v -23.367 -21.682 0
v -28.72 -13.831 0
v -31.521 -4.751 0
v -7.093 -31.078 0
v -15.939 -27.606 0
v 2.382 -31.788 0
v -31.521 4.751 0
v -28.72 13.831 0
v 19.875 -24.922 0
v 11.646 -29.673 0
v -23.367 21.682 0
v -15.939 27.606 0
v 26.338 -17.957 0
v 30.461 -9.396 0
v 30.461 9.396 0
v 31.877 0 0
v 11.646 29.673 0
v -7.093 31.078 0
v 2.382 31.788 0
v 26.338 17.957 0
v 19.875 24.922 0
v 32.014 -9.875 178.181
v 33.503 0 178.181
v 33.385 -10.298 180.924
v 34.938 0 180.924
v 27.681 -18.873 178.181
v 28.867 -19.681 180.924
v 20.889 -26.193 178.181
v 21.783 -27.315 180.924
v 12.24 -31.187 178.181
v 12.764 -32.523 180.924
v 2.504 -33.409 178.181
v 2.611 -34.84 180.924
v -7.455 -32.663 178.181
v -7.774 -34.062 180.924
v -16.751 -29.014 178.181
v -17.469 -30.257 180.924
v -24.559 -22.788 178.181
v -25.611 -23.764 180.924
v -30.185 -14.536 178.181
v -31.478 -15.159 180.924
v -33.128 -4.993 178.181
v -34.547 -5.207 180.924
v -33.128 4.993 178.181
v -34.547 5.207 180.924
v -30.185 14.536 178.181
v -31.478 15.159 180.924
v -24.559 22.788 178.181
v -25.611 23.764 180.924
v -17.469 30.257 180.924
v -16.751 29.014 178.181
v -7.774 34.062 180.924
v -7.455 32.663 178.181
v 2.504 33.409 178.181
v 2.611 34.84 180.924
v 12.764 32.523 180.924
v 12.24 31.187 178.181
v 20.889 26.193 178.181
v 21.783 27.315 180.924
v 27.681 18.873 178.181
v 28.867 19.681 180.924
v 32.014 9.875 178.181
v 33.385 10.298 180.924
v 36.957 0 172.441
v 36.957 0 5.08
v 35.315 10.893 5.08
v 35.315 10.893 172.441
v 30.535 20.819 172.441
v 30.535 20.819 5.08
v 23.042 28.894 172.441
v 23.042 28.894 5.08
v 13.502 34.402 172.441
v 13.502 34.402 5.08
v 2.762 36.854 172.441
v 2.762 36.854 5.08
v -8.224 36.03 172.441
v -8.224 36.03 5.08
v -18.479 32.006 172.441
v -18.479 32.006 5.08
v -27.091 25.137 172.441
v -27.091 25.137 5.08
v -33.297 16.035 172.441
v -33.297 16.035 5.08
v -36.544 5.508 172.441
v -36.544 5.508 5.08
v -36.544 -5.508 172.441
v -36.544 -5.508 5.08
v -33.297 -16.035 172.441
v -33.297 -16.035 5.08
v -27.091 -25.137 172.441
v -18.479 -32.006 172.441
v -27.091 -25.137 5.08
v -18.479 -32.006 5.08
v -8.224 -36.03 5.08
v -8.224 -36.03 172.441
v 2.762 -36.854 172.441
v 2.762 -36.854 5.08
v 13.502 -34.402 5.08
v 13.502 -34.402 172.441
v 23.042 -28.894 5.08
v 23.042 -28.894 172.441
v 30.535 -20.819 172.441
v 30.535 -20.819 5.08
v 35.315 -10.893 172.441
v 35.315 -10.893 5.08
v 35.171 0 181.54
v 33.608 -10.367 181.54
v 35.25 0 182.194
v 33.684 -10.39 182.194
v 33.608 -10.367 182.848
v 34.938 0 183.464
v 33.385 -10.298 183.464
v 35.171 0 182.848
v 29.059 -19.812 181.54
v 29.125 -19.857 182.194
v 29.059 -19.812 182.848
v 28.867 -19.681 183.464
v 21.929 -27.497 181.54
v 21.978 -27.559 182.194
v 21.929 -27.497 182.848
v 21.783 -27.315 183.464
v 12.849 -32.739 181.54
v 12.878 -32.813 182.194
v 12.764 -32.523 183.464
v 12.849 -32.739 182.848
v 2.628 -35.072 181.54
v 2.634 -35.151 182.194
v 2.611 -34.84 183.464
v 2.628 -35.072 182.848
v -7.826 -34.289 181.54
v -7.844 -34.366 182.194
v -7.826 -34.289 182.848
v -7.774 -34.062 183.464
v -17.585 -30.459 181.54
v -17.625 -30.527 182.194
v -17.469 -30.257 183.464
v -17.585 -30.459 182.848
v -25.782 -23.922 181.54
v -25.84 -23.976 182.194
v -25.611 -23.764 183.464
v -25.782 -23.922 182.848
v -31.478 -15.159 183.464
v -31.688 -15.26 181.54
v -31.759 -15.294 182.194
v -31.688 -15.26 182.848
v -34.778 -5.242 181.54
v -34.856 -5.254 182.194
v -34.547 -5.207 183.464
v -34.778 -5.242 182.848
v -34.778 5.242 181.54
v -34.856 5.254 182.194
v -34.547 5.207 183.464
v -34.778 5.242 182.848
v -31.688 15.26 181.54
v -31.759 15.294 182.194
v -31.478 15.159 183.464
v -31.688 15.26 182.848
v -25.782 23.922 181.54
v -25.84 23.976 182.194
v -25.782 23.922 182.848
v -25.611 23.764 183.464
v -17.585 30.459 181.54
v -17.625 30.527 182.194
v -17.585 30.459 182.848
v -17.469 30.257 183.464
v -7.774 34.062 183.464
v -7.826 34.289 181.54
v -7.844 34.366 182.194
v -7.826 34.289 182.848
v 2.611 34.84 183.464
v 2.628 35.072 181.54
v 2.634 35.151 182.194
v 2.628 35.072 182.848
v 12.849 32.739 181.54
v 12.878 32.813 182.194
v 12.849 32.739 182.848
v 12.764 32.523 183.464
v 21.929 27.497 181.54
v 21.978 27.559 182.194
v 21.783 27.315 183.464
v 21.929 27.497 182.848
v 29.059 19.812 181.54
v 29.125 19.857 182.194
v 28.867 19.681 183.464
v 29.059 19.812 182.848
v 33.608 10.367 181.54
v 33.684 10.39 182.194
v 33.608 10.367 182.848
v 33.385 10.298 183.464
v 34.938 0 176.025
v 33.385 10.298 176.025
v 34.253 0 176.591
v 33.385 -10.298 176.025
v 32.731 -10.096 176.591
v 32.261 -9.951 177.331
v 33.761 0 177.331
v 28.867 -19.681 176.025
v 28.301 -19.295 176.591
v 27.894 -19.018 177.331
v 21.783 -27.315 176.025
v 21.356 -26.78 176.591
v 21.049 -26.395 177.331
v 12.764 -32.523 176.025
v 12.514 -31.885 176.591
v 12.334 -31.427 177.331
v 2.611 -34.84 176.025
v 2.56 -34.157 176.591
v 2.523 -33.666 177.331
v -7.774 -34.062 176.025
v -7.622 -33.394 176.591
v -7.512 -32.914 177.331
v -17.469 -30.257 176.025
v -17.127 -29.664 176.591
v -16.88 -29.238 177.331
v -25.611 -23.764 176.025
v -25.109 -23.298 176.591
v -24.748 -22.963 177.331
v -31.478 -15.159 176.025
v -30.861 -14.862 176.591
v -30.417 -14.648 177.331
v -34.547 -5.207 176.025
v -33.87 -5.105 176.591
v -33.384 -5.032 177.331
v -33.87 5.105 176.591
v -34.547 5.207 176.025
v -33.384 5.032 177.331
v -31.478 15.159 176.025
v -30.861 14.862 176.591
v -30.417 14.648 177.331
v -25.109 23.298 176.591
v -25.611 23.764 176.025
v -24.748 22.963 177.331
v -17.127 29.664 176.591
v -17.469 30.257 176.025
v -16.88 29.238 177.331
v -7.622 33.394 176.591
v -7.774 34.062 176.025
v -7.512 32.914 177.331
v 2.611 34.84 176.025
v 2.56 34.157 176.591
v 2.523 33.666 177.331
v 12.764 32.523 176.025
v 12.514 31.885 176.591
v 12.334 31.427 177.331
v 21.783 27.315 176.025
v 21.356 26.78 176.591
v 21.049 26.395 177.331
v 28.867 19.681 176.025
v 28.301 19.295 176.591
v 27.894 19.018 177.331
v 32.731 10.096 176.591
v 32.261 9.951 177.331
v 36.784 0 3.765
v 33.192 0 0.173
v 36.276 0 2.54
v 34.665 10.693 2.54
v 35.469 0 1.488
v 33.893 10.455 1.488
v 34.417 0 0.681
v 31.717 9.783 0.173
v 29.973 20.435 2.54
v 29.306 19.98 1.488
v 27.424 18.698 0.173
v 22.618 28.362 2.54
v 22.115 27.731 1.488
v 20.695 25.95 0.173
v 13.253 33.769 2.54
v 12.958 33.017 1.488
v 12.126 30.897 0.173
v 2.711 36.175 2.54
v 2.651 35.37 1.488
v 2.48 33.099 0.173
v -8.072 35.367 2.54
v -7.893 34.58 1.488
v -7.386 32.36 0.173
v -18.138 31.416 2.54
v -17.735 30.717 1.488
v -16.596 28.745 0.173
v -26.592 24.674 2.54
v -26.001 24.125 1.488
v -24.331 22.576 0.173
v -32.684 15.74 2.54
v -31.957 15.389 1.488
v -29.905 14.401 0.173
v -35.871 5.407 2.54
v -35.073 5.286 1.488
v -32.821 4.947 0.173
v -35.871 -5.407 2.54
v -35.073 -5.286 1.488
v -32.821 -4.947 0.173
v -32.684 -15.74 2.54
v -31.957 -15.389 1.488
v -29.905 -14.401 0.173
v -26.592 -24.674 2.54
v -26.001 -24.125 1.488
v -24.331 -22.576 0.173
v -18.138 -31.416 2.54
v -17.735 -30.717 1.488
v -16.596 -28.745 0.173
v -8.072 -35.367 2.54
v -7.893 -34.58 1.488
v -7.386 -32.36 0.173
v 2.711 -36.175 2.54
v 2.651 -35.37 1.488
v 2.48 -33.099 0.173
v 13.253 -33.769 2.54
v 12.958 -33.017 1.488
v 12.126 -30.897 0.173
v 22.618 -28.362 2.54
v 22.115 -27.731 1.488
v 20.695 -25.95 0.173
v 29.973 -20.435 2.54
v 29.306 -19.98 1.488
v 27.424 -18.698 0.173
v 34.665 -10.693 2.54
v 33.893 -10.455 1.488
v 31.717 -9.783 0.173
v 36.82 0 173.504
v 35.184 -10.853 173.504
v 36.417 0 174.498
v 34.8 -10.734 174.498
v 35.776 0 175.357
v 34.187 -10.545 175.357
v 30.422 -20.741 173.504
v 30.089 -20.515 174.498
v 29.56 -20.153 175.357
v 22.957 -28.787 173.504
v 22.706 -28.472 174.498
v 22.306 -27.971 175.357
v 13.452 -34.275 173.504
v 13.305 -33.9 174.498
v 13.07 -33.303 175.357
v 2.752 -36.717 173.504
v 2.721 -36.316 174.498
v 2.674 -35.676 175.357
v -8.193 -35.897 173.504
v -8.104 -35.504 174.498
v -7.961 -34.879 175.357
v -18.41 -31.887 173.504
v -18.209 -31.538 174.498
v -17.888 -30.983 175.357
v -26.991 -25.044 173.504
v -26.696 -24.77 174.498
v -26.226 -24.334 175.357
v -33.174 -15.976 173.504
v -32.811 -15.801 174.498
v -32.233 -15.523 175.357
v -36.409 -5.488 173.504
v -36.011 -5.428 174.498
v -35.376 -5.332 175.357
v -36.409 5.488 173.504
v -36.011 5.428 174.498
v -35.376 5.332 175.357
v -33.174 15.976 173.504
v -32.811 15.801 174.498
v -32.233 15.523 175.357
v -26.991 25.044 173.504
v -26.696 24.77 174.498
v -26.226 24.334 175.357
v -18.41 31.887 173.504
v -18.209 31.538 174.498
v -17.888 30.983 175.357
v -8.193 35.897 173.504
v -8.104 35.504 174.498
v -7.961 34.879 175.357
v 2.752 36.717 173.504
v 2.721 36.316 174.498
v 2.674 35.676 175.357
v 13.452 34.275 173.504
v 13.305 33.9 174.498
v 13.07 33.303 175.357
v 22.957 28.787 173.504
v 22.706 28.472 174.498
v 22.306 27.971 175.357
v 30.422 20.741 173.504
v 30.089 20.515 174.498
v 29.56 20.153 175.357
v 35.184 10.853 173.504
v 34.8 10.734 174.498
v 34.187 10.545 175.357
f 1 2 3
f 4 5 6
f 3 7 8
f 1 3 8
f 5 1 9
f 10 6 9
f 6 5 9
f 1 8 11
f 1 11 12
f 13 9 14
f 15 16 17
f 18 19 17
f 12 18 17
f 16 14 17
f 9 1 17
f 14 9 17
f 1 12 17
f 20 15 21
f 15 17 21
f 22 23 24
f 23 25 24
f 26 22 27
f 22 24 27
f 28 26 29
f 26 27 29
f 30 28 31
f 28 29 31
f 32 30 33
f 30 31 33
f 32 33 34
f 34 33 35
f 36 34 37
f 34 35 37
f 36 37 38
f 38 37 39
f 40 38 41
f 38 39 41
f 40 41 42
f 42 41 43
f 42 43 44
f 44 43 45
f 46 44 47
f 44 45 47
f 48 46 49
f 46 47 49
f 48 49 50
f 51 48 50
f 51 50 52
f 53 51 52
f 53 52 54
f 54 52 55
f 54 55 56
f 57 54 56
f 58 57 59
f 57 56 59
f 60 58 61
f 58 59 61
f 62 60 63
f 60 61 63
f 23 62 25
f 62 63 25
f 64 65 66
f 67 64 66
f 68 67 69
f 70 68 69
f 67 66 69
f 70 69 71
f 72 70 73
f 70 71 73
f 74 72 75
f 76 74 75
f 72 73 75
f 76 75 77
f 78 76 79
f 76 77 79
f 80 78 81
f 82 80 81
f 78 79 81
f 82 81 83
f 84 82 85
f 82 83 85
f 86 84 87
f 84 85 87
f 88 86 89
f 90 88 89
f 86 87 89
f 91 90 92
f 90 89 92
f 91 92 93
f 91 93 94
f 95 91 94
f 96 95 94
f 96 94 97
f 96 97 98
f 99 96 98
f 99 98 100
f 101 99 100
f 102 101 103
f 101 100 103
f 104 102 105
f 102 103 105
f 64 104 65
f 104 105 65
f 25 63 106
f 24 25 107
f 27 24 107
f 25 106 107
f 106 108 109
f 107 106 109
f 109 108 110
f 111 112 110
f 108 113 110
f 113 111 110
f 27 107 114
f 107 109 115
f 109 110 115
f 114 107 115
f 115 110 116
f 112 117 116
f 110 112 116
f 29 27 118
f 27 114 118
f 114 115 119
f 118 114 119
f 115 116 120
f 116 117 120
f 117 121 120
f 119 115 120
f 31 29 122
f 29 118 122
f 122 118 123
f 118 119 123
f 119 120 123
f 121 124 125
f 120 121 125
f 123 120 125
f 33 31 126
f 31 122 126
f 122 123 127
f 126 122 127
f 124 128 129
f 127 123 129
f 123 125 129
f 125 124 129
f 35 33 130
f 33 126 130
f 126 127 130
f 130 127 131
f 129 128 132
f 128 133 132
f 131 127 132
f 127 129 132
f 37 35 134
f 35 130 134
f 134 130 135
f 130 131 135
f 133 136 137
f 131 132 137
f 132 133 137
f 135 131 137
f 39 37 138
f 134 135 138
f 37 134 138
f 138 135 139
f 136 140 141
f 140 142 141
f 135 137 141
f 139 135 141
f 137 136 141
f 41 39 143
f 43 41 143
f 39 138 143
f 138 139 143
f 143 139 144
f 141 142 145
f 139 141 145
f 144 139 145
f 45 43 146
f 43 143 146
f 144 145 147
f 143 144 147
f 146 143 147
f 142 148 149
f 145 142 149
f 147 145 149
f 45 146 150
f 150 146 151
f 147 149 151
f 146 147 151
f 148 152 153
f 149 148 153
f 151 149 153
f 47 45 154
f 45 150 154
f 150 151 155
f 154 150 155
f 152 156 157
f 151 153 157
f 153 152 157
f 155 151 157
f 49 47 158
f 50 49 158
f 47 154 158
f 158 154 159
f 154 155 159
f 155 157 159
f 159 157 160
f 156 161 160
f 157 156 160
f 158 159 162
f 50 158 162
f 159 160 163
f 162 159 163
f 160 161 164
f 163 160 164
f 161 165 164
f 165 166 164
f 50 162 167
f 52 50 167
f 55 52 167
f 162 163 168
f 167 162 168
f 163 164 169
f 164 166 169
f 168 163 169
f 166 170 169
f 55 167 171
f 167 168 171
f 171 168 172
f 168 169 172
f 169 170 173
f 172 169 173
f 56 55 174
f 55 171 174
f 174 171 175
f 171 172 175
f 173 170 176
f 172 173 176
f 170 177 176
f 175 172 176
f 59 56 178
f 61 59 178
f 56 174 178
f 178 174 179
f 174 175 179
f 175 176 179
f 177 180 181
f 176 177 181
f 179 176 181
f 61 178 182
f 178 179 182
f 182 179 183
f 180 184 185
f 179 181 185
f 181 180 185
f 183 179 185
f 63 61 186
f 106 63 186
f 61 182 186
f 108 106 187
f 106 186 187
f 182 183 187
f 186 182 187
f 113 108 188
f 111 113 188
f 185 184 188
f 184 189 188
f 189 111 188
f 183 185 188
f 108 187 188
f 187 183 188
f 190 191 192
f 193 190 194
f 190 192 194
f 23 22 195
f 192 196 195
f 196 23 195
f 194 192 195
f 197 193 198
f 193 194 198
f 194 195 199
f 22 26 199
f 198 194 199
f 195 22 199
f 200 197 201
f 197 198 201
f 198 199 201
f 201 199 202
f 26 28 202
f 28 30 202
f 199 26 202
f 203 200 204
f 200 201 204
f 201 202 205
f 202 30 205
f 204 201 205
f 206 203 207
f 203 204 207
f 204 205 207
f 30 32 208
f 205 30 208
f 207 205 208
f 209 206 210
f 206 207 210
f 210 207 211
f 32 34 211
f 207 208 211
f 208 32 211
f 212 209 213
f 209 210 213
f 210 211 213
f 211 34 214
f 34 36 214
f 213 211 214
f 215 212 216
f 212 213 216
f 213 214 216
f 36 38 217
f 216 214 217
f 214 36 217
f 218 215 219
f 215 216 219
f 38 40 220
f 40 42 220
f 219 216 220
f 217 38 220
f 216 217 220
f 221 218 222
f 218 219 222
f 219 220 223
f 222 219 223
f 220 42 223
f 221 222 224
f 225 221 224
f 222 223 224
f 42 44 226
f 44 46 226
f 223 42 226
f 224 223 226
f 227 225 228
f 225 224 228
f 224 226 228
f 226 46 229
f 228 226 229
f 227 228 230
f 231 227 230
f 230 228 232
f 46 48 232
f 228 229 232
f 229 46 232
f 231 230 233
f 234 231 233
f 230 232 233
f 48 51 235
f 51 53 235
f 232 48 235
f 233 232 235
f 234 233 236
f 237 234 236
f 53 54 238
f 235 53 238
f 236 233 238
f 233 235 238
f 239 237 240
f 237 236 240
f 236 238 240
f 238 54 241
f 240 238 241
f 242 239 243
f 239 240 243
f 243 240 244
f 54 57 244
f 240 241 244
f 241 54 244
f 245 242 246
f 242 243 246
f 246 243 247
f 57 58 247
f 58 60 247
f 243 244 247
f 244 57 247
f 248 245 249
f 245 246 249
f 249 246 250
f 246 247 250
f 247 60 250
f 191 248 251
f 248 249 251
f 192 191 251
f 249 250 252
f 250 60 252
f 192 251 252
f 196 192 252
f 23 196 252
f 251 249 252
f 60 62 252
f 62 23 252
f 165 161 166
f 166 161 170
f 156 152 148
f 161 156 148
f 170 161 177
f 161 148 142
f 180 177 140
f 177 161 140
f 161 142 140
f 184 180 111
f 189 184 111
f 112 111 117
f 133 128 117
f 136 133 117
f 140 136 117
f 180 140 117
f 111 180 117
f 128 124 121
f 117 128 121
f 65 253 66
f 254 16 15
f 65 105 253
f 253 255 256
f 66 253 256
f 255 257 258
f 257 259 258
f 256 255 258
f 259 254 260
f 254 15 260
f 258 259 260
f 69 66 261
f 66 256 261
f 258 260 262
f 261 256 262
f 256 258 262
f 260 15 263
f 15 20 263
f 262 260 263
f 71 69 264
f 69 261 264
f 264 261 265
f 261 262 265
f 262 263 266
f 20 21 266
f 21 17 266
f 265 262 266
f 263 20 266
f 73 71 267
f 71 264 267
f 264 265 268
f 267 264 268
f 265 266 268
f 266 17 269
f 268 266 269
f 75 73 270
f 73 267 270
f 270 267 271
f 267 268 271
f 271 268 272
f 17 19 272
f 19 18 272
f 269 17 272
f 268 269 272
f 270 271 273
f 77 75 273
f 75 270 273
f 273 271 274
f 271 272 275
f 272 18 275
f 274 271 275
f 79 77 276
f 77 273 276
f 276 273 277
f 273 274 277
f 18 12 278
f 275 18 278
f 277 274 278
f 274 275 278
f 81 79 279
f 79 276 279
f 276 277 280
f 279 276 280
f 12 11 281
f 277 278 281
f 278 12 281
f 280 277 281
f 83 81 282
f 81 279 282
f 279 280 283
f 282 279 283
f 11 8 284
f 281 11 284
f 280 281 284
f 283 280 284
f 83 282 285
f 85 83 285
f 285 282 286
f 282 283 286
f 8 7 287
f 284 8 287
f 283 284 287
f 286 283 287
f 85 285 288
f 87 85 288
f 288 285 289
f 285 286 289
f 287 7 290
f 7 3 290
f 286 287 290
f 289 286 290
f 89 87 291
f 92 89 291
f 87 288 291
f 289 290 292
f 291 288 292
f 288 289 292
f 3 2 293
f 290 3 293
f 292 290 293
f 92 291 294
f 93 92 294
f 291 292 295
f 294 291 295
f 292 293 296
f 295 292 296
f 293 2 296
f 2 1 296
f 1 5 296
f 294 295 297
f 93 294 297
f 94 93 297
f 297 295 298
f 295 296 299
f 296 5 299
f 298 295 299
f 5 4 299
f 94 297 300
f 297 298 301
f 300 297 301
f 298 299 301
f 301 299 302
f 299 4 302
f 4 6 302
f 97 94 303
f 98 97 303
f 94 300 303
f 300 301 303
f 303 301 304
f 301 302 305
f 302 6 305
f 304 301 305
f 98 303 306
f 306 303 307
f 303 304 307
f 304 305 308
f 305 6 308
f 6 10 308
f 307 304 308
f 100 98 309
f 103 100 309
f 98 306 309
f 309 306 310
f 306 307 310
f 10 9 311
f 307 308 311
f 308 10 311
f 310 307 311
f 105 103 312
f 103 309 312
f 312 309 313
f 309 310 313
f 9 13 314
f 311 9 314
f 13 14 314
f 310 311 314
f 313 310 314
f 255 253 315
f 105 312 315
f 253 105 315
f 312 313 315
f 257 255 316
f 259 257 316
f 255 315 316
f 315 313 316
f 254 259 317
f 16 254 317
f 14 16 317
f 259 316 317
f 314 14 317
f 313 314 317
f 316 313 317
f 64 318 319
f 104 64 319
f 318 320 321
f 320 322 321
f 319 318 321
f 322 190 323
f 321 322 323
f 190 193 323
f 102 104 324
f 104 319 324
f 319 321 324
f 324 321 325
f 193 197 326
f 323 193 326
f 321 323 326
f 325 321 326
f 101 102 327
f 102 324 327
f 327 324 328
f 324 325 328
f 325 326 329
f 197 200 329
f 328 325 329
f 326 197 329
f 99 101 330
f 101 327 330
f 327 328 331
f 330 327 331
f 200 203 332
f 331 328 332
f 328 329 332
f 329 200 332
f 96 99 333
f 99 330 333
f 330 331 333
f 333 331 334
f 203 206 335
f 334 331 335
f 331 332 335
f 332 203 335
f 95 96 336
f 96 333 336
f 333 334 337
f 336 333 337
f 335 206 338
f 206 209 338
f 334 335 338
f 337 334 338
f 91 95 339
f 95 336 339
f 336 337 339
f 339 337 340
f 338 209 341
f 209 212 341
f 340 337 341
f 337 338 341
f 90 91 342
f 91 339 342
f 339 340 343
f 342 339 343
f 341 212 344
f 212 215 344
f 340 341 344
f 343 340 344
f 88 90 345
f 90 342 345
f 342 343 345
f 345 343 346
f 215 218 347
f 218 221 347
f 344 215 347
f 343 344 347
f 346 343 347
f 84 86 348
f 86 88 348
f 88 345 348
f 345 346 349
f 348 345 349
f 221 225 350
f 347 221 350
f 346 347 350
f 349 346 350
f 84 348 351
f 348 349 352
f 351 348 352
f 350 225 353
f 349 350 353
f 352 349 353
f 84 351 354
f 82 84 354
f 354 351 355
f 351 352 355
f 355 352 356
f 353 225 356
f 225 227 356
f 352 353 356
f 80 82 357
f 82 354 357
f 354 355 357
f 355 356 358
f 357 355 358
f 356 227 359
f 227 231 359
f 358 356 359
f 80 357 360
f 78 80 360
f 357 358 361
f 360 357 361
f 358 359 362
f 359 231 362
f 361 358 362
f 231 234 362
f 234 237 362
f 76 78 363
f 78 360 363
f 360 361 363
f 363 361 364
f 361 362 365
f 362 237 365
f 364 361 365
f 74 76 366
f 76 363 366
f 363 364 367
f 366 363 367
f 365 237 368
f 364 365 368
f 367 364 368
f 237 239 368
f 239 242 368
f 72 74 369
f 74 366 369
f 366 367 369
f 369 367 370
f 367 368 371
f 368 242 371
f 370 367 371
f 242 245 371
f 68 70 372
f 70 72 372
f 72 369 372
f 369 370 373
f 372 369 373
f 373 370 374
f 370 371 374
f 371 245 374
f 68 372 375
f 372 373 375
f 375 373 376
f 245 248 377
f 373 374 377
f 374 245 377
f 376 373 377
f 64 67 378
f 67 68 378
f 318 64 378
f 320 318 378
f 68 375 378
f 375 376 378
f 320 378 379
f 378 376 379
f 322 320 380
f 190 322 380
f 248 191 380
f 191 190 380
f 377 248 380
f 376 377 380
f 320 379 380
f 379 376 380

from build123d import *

# Parameters (mm, degrees)
F0_R     = 36.957
F1_DEPTH = 172.4406
F4_R     = 5.08


with BuildPart() as f1:
    # F0 (on Top) → F1 (new body)
    with BuildSketch(Plane.XY):
        Circle(F0_R)
    extrude(amount=F1_DEPTH)

    # F2 (on Front) → F3 (revolve)
    with BuildSketch(Plane.XZ):
        with BuildLine():
            Line((0, 172.4406), (36.957, 172.4406))
            ThreePointArc((36.957, 172.4406), (36.417433, 174.497665), (34.937665, 176.02506))
            ThreePointArc((34.937665, 176.02506), (33.979759, 176.943029), (33.5026, 178.181))
            Line((33.5026, 178.181), (34.937665, 180.924344))
            ThreePointArc((34.937665, 180.924344), (35.249759, 182.194272), (34.937665, 183.4642))
            Line((34.937665, 183.4642), (0, 183.4642))
            Line((0, 183.4642), (0, 172.4406))
        make_face()
    revolve(axis=Axis((0, 0, 177.9524), (0, 0, -1)))

    # F4
    f4_edges = [f1.edges().sort_by_distance(p)[0] for p in [
        (-36.957, 0, 0),
    ]]
    fillet(f4_edges, radius=F4_R)


solid = f1.part
